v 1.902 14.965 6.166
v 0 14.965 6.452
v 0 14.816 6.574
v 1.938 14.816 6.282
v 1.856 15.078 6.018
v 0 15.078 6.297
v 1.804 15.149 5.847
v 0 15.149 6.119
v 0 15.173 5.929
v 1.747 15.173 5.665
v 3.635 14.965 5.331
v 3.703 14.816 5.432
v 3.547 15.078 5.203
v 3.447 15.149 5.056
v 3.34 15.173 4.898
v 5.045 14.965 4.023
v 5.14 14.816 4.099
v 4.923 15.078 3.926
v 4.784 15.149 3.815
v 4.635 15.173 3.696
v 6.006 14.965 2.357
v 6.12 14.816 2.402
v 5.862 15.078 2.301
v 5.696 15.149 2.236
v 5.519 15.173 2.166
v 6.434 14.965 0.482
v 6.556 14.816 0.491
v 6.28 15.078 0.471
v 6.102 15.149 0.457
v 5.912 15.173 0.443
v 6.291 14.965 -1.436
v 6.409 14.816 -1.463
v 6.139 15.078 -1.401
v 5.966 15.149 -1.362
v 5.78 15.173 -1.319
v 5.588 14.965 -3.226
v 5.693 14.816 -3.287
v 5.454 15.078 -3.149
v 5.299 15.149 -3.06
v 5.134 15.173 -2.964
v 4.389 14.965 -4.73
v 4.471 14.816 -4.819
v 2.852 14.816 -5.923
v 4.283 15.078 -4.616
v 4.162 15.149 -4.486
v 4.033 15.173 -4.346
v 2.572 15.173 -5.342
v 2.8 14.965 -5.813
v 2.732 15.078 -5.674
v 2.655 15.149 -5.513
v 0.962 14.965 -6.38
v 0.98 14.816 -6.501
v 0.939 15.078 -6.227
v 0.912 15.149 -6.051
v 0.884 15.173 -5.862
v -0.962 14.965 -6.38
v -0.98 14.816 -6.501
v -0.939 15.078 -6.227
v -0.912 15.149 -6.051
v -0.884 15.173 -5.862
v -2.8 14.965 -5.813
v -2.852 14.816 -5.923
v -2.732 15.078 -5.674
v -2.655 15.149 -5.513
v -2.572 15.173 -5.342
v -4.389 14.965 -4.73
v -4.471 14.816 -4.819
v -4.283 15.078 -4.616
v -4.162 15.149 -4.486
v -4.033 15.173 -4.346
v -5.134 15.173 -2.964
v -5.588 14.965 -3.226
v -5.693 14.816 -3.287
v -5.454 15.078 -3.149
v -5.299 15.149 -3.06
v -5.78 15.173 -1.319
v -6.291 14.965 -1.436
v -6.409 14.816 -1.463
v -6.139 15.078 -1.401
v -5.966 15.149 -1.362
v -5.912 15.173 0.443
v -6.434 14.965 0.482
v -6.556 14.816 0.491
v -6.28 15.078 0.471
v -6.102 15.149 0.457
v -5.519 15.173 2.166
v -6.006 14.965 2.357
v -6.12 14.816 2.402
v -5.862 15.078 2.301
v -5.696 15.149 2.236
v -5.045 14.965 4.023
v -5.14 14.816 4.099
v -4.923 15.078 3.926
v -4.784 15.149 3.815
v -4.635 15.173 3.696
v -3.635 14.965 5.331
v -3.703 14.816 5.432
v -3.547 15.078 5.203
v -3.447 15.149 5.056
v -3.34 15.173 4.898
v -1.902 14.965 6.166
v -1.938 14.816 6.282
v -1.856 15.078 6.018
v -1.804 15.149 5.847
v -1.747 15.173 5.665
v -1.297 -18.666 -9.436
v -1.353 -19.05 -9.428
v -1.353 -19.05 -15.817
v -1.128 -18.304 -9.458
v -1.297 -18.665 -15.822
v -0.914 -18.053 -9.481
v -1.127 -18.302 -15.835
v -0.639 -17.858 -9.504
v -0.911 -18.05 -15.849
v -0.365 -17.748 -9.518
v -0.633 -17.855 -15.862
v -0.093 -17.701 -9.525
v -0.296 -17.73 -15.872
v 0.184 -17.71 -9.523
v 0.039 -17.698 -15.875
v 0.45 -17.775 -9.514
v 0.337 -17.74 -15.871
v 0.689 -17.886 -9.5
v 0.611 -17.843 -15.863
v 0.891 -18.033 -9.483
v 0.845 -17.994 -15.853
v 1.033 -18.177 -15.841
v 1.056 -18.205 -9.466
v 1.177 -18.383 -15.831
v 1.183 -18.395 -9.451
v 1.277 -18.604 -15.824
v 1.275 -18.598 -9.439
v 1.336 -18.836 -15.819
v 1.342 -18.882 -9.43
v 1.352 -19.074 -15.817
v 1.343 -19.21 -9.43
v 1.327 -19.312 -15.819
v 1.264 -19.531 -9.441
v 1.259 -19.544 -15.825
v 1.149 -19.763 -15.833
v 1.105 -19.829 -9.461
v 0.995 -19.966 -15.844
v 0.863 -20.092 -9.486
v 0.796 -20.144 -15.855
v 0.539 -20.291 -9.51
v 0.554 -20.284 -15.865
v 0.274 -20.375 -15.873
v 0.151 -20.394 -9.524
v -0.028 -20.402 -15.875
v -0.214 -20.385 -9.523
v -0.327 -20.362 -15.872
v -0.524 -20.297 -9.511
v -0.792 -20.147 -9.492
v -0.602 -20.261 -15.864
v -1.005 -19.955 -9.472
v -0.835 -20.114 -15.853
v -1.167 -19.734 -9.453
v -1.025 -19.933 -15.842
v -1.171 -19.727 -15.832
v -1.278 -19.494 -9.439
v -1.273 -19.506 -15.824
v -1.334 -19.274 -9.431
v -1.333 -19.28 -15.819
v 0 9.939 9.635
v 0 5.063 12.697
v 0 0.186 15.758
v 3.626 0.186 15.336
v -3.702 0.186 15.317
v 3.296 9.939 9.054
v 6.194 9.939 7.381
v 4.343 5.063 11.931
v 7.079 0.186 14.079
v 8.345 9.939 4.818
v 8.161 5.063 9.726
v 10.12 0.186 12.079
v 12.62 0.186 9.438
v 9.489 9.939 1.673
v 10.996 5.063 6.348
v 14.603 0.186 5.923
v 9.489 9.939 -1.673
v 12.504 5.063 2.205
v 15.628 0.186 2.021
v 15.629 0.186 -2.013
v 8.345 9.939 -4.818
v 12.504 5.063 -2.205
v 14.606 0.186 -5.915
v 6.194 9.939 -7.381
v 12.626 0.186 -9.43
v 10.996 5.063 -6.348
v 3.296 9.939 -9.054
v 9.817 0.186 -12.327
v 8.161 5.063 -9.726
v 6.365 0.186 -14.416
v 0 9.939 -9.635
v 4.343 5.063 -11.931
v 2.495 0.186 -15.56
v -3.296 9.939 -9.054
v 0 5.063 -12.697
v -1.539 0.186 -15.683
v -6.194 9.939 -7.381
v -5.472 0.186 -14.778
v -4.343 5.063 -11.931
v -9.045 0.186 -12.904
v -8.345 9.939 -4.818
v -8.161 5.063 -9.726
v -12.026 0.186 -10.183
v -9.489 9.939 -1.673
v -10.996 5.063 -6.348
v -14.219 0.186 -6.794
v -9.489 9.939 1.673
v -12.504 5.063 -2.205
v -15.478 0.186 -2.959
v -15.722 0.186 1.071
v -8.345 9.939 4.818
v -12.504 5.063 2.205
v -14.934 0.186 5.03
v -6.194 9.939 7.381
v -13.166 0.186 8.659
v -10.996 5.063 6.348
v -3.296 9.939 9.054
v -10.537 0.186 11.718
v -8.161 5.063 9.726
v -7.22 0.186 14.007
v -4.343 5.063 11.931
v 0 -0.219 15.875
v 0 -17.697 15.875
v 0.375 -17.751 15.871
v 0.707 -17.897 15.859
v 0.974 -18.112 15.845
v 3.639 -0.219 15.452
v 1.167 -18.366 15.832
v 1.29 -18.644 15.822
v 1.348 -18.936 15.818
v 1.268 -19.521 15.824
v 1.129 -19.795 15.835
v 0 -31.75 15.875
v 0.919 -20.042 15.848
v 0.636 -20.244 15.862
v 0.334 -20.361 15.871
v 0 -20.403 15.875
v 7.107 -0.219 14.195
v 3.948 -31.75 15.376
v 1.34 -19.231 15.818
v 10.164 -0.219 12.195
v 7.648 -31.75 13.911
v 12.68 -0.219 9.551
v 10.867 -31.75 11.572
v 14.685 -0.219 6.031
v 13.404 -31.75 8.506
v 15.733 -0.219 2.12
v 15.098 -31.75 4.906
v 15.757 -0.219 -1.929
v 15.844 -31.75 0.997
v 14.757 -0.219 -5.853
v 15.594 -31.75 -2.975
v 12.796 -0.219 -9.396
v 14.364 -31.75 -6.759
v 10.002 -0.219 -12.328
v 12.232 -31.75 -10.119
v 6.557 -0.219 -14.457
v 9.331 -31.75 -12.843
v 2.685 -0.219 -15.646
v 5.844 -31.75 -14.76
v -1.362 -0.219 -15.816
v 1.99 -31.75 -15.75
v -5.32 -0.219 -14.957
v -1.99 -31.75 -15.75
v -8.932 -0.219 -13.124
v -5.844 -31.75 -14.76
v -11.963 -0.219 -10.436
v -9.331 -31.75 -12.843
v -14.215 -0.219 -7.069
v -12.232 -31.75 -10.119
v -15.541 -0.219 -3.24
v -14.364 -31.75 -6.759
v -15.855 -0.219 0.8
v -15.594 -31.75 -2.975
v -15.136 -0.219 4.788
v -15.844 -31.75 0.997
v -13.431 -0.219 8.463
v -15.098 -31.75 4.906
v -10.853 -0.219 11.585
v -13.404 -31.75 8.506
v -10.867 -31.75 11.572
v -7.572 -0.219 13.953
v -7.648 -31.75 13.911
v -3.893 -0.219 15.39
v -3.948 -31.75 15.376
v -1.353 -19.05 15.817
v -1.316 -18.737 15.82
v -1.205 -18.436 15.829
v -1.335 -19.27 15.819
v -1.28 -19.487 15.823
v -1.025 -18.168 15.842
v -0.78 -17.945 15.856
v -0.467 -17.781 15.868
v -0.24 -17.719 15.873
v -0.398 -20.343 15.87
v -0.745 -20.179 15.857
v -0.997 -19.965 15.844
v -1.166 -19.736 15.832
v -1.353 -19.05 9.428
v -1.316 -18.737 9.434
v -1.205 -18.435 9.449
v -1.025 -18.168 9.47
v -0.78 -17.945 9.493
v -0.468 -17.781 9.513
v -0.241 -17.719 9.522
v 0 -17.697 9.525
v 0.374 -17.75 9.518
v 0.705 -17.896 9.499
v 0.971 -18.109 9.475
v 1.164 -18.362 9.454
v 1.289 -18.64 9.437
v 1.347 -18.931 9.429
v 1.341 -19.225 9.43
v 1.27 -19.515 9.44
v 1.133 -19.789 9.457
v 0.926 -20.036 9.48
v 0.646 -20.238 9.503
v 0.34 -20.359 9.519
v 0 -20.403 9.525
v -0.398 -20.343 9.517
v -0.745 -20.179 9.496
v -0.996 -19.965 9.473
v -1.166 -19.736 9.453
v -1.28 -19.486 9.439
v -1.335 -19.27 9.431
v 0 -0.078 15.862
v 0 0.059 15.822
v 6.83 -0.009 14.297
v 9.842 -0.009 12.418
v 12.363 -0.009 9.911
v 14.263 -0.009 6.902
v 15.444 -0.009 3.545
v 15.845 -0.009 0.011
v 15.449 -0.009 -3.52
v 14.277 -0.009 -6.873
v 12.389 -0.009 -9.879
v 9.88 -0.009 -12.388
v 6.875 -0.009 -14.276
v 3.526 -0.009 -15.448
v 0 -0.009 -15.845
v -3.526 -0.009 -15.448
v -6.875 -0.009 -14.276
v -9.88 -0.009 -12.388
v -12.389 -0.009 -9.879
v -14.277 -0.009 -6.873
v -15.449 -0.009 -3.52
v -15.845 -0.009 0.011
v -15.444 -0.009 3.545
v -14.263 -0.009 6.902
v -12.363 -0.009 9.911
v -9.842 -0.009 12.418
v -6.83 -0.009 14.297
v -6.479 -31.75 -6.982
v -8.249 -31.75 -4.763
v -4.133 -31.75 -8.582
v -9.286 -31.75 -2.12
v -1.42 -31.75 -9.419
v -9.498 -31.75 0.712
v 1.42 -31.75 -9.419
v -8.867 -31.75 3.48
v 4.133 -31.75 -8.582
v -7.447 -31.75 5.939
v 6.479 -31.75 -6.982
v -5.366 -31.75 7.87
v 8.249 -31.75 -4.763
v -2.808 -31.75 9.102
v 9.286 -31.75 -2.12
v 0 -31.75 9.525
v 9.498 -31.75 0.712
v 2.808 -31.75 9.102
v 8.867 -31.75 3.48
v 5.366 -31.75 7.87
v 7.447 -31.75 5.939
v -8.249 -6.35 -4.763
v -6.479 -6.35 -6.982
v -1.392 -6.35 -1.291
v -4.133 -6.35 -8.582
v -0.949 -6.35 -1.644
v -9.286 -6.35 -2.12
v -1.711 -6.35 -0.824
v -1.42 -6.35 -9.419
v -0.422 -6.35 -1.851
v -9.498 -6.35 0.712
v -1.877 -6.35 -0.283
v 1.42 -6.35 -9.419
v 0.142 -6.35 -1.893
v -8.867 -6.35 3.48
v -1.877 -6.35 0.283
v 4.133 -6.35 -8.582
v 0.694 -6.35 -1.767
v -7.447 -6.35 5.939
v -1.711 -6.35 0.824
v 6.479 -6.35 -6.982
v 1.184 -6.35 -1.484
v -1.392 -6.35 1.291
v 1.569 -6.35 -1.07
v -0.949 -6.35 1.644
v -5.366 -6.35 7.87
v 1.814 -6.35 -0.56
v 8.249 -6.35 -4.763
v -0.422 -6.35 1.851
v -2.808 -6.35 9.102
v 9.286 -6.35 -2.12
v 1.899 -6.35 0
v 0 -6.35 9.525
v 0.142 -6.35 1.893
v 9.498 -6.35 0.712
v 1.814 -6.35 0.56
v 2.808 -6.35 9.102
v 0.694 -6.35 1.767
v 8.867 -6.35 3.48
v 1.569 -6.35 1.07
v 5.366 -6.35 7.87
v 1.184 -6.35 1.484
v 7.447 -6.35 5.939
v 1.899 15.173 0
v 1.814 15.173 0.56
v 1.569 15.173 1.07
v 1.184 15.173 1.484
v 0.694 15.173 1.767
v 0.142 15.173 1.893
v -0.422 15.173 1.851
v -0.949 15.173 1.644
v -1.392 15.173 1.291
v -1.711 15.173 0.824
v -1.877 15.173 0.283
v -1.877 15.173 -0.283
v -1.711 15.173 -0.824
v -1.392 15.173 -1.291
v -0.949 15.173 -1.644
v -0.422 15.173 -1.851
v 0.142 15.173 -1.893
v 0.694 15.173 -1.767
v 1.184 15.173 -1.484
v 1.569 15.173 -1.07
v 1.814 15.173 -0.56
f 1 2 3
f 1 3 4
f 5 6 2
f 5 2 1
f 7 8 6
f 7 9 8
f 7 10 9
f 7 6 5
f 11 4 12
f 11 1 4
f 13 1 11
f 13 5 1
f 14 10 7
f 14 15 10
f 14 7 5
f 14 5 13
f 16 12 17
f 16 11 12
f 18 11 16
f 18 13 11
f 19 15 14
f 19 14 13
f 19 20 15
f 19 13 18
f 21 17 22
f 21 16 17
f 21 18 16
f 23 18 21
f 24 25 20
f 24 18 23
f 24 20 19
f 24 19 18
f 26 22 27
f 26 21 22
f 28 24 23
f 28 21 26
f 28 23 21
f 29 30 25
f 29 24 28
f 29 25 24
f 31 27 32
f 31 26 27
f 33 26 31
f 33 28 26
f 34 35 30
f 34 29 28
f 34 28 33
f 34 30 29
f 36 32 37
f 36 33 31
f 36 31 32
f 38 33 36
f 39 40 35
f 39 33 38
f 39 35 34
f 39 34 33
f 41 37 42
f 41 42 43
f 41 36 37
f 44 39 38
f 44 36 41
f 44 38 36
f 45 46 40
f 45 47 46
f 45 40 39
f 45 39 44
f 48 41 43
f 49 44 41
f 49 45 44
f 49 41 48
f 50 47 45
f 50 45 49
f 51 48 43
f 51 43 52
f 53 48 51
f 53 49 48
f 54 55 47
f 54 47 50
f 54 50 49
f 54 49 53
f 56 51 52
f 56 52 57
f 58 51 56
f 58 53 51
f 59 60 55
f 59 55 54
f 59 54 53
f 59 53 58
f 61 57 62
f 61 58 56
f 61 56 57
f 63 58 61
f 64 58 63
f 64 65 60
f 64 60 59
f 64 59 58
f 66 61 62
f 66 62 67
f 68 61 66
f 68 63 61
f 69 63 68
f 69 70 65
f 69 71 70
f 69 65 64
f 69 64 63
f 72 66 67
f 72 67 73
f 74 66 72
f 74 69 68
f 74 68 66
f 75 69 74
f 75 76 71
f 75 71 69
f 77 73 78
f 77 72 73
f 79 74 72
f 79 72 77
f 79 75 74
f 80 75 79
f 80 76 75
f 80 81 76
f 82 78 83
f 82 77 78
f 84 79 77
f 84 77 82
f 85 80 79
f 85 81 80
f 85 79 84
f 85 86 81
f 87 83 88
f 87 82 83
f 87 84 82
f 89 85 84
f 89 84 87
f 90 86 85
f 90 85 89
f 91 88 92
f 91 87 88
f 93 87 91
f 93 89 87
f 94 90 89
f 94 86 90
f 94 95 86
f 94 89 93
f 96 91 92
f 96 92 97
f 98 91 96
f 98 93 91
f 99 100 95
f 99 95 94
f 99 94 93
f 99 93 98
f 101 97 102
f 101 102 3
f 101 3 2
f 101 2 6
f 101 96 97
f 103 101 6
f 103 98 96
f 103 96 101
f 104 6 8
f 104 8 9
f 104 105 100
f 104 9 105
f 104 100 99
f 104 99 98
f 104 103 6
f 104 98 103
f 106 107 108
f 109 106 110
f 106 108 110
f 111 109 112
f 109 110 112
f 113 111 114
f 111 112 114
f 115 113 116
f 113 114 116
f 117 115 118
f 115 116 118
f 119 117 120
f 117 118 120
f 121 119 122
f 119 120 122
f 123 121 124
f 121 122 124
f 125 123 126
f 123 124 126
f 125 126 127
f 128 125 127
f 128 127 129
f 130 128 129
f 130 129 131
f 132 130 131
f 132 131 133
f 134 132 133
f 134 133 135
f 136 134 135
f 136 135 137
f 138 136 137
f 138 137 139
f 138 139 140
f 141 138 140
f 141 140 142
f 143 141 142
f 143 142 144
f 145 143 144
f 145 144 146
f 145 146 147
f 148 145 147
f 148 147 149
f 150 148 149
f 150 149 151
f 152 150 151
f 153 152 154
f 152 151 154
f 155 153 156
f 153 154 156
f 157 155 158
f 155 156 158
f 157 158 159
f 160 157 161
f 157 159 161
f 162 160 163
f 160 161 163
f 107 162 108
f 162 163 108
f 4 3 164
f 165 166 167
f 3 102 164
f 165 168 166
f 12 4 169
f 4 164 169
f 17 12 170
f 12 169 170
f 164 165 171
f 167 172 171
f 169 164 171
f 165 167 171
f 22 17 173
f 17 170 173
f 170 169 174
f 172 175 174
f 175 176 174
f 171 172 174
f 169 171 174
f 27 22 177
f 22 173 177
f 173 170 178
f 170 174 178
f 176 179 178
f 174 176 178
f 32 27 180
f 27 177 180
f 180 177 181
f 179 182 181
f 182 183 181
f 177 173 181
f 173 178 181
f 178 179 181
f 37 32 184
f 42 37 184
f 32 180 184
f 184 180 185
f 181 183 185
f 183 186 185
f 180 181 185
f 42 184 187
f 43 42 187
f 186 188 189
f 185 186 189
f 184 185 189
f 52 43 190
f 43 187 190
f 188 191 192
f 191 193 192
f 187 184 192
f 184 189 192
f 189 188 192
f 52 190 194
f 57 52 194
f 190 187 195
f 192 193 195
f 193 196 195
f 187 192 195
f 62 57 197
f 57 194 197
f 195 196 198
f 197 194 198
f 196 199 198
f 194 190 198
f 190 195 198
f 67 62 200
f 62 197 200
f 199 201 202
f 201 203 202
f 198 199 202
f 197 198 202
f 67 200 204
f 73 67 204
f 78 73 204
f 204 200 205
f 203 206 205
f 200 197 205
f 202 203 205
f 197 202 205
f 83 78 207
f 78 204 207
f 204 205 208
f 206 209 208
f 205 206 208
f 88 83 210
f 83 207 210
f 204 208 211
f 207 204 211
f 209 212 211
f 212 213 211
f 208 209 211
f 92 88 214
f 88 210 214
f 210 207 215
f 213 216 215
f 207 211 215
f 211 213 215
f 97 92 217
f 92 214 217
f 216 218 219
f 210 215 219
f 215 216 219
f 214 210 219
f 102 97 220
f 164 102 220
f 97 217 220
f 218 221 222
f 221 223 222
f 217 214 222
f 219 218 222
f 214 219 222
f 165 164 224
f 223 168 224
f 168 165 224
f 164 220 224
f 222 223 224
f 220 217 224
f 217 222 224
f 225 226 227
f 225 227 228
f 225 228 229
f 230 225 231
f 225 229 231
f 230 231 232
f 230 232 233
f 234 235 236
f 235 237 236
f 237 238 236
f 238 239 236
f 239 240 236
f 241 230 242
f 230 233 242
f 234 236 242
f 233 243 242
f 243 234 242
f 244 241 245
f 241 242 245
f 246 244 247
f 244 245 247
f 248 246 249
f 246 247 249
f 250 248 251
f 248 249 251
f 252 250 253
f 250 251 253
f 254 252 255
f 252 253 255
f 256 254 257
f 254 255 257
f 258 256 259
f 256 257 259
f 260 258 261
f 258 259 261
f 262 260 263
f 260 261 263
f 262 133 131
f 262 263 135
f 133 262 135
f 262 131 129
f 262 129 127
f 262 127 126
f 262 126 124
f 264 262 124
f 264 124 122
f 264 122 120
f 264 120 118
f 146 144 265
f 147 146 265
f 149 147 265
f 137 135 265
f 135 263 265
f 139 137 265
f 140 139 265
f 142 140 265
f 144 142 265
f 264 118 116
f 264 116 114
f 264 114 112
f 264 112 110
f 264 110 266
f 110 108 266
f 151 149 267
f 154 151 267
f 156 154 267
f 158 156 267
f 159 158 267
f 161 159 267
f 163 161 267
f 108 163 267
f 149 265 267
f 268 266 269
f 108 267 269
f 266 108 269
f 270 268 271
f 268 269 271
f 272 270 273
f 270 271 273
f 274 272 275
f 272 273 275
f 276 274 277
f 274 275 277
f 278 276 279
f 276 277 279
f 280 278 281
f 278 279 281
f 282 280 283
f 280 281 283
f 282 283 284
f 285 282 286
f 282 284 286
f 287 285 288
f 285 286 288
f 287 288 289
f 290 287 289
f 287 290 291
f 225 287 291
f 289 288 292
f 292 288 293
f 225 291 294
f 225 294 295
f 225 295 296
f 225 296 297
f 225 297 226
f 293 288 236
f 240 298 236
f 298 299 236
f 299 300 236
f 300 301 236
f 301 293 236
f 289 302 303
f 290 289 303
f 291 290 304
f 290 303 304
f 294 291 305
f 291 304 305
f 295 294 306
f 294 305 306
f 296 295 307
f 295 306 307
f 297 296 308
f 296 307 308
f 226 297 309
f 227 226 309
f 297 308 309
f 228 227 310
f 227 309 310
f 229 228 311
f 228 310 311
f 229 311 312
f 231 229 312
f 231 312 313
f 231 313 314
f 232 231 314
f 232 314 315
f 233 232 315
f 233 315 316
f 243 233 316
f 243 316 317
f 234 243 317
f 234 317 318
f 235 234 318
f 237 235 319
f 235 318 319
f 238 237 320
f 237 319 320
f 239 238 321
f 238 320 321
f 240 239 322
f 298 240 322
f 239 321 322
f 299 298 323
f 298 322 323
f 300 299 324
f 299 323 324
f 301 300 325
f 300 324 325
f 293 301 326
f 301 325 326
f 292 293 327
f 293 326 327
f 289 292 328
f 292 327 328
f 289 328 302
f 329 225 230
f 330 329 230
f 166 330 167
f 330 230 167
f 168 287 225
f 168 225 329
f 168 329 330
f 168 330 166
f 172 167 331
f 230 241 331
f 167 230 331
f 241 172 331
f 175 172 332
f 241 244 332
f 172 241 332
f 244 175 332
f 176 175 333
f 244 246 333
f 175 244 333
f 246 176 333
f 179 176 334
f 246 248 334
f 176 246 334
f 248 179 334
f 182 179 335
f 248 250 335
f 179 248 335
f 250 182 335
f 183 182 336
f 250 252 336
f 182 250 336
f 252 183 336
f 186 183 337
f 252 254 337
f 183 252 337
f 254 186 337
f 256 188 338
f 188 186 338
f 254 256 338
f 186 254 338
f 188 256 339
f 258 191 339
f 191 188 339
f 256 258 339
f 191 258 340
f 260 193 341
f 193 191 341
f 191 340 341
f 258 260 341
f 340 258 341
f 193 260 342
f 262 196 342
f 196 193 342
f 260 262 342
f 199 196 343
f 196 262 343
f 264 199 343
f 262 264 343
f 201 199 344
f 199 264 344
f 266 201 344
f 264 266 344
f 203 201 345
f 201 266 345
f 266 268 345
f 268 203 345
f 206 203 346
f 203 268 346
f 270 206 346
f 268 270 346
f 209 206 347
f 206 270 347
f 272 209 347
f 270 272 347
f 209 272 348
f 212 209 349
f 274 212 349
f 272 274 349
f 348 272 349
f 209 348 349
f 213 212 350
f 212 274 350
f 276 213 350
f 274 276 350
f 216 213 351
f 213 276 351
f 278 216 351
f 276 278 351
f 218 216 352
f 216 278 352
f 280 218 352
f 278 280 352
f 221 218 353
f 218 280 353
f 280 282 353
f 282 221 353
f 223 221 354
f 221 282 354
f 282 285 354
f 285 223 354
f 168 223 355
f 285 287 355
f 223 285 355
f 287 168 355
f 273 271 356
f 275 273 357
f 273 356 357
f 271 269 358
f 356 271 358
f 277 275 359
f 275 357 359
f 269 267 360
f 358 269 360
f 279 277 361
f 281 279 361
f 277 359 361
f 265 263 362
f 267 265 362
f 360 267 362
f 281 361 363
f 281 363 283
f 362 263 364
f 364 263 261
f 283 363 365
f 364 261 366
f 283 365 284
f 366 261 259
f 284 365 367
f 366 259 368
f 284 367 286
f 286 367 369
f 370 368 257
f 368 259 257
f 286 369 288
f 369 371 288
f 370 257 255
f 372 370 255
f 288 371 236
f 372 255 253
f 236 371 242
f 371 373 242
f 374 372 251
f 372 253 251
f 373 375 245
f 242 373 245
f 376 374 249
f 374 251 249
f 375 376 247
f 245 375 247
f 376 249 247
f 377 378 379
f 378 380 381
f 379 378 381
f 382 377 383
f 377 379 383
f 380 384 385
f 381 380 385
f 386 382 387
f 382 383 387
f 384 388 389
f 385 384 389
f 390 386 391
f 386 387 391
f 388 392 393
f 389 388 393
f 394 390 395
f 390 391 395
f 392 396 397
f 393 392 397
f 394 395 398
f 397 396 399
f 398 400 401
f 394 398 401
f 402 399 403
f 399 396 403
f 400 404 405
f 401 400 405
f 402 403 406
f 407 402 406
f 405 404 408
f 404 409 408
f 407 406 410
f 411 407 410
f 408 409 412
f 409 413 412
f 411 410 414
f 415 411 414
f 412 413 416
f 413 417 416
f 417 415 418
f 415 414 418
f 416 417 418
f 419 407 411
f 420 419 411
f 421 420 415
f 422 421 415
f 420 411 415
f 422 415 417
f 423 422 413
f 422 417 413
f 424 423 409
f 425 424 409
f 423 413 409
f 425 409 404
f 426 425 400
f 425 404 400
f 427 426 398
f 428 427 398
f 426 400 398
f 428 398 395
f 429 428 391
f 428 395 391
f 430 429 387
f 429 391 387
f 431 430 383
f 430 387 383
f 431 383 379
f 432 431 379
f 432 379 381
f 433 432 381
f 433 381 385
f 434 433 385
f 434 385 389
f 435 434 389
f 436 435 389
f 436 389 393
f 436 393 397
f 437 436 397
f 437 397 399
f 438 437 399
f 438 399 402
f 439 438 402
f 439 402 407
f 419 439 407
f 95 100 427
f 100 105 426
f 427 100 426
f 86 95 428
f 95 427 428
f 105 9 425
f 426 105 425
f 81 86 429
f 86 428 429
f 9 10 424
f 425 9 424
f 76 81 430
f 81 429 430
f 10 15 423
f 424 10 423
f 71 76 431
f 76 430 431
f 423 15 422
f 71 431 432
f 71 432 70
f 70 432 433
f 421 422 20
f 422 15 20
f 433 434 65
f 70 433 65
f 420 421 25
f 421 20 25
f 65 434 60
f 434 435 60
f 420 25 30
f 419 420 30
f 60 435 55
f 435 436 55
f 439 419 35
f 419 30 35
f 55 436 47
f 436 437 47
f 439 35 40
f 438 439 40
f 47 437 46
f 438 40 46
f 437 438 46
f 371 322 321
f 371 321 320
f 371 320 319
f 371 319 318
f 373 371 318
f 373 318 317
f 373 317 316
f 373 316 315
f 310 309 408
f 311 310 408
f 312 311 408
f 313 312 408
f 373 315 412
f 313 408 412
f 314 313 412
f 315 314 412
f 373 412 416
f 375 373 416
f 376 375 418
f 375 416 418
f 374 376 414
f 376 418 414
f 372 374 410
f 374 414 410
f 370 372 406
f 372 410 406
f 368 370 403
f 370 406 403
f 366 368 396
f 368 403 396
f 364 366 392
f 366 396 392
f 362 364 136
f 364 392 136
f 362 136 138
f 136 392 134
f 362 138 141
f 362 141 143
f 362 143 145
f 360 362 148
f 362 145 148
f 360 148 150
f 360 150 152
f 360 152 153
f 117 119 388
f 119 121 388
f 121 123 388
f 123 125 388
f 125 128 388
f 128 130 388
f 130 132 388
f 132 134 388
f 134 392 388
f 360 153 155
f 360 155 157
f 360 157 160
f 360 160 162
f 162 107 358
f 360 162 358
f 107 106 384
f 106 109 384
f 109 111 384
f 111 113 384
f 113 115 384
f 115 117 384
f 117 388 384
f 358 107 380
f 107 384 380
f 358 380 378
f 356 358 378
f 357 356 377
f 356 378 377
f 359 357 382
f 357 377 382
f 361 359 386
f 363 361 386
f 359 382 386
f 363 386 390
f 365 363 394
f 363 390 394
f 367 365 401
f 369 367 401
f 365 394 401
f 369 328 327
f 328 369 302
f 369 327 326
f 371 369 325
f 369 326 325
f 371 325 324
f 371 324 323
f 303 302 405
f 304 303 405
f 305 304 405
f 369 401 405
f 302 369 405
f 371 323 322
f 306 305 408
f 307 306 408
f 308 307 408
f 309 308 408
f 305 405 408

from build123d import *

# Parameters (mm, degrees)
F3_D = 3.7973
F6_D = 2.7051
F7_R = 0.762


with BuildPart() as f1:
    # F0 (on Right) → F1 (revolve)
    with BuildSketch(Plane.YZ):
        Polygon((0, 15.875), (-31.75, 15.875), (-31.75, 9.525), (-6.35, 9.525), (-6.35, 0), (15.1730990037, 0), (15.1730990037, 6.35), align=None)
    revolve(axis=Axis((0, 4.4115495019, 0), (0, 1, 0)))

    # F3 (through all)
    with Locations(Plane(origin=(0, 15.1730990037, 0), x_dir=(-1, 0, 0), z_dir=(0, 1, 0))):
        with Locations((0, 0)):
            Hole(F3_D / 2)

    # F6 (through all)
    with Locations(Plane.XY.offset(17.018)):
        with Locations((0, -19.05)):
            Hole(F6_D / 2)

    # F7
    f7_edges = [f1.edges().sort_by_distance(p)[0] for p in [
        (0, 15.173099, -6.35),
        (0, 0, -15.875),
    ]]
    fillet(f7_edges, radius=F7_R)


solid = f1.part
